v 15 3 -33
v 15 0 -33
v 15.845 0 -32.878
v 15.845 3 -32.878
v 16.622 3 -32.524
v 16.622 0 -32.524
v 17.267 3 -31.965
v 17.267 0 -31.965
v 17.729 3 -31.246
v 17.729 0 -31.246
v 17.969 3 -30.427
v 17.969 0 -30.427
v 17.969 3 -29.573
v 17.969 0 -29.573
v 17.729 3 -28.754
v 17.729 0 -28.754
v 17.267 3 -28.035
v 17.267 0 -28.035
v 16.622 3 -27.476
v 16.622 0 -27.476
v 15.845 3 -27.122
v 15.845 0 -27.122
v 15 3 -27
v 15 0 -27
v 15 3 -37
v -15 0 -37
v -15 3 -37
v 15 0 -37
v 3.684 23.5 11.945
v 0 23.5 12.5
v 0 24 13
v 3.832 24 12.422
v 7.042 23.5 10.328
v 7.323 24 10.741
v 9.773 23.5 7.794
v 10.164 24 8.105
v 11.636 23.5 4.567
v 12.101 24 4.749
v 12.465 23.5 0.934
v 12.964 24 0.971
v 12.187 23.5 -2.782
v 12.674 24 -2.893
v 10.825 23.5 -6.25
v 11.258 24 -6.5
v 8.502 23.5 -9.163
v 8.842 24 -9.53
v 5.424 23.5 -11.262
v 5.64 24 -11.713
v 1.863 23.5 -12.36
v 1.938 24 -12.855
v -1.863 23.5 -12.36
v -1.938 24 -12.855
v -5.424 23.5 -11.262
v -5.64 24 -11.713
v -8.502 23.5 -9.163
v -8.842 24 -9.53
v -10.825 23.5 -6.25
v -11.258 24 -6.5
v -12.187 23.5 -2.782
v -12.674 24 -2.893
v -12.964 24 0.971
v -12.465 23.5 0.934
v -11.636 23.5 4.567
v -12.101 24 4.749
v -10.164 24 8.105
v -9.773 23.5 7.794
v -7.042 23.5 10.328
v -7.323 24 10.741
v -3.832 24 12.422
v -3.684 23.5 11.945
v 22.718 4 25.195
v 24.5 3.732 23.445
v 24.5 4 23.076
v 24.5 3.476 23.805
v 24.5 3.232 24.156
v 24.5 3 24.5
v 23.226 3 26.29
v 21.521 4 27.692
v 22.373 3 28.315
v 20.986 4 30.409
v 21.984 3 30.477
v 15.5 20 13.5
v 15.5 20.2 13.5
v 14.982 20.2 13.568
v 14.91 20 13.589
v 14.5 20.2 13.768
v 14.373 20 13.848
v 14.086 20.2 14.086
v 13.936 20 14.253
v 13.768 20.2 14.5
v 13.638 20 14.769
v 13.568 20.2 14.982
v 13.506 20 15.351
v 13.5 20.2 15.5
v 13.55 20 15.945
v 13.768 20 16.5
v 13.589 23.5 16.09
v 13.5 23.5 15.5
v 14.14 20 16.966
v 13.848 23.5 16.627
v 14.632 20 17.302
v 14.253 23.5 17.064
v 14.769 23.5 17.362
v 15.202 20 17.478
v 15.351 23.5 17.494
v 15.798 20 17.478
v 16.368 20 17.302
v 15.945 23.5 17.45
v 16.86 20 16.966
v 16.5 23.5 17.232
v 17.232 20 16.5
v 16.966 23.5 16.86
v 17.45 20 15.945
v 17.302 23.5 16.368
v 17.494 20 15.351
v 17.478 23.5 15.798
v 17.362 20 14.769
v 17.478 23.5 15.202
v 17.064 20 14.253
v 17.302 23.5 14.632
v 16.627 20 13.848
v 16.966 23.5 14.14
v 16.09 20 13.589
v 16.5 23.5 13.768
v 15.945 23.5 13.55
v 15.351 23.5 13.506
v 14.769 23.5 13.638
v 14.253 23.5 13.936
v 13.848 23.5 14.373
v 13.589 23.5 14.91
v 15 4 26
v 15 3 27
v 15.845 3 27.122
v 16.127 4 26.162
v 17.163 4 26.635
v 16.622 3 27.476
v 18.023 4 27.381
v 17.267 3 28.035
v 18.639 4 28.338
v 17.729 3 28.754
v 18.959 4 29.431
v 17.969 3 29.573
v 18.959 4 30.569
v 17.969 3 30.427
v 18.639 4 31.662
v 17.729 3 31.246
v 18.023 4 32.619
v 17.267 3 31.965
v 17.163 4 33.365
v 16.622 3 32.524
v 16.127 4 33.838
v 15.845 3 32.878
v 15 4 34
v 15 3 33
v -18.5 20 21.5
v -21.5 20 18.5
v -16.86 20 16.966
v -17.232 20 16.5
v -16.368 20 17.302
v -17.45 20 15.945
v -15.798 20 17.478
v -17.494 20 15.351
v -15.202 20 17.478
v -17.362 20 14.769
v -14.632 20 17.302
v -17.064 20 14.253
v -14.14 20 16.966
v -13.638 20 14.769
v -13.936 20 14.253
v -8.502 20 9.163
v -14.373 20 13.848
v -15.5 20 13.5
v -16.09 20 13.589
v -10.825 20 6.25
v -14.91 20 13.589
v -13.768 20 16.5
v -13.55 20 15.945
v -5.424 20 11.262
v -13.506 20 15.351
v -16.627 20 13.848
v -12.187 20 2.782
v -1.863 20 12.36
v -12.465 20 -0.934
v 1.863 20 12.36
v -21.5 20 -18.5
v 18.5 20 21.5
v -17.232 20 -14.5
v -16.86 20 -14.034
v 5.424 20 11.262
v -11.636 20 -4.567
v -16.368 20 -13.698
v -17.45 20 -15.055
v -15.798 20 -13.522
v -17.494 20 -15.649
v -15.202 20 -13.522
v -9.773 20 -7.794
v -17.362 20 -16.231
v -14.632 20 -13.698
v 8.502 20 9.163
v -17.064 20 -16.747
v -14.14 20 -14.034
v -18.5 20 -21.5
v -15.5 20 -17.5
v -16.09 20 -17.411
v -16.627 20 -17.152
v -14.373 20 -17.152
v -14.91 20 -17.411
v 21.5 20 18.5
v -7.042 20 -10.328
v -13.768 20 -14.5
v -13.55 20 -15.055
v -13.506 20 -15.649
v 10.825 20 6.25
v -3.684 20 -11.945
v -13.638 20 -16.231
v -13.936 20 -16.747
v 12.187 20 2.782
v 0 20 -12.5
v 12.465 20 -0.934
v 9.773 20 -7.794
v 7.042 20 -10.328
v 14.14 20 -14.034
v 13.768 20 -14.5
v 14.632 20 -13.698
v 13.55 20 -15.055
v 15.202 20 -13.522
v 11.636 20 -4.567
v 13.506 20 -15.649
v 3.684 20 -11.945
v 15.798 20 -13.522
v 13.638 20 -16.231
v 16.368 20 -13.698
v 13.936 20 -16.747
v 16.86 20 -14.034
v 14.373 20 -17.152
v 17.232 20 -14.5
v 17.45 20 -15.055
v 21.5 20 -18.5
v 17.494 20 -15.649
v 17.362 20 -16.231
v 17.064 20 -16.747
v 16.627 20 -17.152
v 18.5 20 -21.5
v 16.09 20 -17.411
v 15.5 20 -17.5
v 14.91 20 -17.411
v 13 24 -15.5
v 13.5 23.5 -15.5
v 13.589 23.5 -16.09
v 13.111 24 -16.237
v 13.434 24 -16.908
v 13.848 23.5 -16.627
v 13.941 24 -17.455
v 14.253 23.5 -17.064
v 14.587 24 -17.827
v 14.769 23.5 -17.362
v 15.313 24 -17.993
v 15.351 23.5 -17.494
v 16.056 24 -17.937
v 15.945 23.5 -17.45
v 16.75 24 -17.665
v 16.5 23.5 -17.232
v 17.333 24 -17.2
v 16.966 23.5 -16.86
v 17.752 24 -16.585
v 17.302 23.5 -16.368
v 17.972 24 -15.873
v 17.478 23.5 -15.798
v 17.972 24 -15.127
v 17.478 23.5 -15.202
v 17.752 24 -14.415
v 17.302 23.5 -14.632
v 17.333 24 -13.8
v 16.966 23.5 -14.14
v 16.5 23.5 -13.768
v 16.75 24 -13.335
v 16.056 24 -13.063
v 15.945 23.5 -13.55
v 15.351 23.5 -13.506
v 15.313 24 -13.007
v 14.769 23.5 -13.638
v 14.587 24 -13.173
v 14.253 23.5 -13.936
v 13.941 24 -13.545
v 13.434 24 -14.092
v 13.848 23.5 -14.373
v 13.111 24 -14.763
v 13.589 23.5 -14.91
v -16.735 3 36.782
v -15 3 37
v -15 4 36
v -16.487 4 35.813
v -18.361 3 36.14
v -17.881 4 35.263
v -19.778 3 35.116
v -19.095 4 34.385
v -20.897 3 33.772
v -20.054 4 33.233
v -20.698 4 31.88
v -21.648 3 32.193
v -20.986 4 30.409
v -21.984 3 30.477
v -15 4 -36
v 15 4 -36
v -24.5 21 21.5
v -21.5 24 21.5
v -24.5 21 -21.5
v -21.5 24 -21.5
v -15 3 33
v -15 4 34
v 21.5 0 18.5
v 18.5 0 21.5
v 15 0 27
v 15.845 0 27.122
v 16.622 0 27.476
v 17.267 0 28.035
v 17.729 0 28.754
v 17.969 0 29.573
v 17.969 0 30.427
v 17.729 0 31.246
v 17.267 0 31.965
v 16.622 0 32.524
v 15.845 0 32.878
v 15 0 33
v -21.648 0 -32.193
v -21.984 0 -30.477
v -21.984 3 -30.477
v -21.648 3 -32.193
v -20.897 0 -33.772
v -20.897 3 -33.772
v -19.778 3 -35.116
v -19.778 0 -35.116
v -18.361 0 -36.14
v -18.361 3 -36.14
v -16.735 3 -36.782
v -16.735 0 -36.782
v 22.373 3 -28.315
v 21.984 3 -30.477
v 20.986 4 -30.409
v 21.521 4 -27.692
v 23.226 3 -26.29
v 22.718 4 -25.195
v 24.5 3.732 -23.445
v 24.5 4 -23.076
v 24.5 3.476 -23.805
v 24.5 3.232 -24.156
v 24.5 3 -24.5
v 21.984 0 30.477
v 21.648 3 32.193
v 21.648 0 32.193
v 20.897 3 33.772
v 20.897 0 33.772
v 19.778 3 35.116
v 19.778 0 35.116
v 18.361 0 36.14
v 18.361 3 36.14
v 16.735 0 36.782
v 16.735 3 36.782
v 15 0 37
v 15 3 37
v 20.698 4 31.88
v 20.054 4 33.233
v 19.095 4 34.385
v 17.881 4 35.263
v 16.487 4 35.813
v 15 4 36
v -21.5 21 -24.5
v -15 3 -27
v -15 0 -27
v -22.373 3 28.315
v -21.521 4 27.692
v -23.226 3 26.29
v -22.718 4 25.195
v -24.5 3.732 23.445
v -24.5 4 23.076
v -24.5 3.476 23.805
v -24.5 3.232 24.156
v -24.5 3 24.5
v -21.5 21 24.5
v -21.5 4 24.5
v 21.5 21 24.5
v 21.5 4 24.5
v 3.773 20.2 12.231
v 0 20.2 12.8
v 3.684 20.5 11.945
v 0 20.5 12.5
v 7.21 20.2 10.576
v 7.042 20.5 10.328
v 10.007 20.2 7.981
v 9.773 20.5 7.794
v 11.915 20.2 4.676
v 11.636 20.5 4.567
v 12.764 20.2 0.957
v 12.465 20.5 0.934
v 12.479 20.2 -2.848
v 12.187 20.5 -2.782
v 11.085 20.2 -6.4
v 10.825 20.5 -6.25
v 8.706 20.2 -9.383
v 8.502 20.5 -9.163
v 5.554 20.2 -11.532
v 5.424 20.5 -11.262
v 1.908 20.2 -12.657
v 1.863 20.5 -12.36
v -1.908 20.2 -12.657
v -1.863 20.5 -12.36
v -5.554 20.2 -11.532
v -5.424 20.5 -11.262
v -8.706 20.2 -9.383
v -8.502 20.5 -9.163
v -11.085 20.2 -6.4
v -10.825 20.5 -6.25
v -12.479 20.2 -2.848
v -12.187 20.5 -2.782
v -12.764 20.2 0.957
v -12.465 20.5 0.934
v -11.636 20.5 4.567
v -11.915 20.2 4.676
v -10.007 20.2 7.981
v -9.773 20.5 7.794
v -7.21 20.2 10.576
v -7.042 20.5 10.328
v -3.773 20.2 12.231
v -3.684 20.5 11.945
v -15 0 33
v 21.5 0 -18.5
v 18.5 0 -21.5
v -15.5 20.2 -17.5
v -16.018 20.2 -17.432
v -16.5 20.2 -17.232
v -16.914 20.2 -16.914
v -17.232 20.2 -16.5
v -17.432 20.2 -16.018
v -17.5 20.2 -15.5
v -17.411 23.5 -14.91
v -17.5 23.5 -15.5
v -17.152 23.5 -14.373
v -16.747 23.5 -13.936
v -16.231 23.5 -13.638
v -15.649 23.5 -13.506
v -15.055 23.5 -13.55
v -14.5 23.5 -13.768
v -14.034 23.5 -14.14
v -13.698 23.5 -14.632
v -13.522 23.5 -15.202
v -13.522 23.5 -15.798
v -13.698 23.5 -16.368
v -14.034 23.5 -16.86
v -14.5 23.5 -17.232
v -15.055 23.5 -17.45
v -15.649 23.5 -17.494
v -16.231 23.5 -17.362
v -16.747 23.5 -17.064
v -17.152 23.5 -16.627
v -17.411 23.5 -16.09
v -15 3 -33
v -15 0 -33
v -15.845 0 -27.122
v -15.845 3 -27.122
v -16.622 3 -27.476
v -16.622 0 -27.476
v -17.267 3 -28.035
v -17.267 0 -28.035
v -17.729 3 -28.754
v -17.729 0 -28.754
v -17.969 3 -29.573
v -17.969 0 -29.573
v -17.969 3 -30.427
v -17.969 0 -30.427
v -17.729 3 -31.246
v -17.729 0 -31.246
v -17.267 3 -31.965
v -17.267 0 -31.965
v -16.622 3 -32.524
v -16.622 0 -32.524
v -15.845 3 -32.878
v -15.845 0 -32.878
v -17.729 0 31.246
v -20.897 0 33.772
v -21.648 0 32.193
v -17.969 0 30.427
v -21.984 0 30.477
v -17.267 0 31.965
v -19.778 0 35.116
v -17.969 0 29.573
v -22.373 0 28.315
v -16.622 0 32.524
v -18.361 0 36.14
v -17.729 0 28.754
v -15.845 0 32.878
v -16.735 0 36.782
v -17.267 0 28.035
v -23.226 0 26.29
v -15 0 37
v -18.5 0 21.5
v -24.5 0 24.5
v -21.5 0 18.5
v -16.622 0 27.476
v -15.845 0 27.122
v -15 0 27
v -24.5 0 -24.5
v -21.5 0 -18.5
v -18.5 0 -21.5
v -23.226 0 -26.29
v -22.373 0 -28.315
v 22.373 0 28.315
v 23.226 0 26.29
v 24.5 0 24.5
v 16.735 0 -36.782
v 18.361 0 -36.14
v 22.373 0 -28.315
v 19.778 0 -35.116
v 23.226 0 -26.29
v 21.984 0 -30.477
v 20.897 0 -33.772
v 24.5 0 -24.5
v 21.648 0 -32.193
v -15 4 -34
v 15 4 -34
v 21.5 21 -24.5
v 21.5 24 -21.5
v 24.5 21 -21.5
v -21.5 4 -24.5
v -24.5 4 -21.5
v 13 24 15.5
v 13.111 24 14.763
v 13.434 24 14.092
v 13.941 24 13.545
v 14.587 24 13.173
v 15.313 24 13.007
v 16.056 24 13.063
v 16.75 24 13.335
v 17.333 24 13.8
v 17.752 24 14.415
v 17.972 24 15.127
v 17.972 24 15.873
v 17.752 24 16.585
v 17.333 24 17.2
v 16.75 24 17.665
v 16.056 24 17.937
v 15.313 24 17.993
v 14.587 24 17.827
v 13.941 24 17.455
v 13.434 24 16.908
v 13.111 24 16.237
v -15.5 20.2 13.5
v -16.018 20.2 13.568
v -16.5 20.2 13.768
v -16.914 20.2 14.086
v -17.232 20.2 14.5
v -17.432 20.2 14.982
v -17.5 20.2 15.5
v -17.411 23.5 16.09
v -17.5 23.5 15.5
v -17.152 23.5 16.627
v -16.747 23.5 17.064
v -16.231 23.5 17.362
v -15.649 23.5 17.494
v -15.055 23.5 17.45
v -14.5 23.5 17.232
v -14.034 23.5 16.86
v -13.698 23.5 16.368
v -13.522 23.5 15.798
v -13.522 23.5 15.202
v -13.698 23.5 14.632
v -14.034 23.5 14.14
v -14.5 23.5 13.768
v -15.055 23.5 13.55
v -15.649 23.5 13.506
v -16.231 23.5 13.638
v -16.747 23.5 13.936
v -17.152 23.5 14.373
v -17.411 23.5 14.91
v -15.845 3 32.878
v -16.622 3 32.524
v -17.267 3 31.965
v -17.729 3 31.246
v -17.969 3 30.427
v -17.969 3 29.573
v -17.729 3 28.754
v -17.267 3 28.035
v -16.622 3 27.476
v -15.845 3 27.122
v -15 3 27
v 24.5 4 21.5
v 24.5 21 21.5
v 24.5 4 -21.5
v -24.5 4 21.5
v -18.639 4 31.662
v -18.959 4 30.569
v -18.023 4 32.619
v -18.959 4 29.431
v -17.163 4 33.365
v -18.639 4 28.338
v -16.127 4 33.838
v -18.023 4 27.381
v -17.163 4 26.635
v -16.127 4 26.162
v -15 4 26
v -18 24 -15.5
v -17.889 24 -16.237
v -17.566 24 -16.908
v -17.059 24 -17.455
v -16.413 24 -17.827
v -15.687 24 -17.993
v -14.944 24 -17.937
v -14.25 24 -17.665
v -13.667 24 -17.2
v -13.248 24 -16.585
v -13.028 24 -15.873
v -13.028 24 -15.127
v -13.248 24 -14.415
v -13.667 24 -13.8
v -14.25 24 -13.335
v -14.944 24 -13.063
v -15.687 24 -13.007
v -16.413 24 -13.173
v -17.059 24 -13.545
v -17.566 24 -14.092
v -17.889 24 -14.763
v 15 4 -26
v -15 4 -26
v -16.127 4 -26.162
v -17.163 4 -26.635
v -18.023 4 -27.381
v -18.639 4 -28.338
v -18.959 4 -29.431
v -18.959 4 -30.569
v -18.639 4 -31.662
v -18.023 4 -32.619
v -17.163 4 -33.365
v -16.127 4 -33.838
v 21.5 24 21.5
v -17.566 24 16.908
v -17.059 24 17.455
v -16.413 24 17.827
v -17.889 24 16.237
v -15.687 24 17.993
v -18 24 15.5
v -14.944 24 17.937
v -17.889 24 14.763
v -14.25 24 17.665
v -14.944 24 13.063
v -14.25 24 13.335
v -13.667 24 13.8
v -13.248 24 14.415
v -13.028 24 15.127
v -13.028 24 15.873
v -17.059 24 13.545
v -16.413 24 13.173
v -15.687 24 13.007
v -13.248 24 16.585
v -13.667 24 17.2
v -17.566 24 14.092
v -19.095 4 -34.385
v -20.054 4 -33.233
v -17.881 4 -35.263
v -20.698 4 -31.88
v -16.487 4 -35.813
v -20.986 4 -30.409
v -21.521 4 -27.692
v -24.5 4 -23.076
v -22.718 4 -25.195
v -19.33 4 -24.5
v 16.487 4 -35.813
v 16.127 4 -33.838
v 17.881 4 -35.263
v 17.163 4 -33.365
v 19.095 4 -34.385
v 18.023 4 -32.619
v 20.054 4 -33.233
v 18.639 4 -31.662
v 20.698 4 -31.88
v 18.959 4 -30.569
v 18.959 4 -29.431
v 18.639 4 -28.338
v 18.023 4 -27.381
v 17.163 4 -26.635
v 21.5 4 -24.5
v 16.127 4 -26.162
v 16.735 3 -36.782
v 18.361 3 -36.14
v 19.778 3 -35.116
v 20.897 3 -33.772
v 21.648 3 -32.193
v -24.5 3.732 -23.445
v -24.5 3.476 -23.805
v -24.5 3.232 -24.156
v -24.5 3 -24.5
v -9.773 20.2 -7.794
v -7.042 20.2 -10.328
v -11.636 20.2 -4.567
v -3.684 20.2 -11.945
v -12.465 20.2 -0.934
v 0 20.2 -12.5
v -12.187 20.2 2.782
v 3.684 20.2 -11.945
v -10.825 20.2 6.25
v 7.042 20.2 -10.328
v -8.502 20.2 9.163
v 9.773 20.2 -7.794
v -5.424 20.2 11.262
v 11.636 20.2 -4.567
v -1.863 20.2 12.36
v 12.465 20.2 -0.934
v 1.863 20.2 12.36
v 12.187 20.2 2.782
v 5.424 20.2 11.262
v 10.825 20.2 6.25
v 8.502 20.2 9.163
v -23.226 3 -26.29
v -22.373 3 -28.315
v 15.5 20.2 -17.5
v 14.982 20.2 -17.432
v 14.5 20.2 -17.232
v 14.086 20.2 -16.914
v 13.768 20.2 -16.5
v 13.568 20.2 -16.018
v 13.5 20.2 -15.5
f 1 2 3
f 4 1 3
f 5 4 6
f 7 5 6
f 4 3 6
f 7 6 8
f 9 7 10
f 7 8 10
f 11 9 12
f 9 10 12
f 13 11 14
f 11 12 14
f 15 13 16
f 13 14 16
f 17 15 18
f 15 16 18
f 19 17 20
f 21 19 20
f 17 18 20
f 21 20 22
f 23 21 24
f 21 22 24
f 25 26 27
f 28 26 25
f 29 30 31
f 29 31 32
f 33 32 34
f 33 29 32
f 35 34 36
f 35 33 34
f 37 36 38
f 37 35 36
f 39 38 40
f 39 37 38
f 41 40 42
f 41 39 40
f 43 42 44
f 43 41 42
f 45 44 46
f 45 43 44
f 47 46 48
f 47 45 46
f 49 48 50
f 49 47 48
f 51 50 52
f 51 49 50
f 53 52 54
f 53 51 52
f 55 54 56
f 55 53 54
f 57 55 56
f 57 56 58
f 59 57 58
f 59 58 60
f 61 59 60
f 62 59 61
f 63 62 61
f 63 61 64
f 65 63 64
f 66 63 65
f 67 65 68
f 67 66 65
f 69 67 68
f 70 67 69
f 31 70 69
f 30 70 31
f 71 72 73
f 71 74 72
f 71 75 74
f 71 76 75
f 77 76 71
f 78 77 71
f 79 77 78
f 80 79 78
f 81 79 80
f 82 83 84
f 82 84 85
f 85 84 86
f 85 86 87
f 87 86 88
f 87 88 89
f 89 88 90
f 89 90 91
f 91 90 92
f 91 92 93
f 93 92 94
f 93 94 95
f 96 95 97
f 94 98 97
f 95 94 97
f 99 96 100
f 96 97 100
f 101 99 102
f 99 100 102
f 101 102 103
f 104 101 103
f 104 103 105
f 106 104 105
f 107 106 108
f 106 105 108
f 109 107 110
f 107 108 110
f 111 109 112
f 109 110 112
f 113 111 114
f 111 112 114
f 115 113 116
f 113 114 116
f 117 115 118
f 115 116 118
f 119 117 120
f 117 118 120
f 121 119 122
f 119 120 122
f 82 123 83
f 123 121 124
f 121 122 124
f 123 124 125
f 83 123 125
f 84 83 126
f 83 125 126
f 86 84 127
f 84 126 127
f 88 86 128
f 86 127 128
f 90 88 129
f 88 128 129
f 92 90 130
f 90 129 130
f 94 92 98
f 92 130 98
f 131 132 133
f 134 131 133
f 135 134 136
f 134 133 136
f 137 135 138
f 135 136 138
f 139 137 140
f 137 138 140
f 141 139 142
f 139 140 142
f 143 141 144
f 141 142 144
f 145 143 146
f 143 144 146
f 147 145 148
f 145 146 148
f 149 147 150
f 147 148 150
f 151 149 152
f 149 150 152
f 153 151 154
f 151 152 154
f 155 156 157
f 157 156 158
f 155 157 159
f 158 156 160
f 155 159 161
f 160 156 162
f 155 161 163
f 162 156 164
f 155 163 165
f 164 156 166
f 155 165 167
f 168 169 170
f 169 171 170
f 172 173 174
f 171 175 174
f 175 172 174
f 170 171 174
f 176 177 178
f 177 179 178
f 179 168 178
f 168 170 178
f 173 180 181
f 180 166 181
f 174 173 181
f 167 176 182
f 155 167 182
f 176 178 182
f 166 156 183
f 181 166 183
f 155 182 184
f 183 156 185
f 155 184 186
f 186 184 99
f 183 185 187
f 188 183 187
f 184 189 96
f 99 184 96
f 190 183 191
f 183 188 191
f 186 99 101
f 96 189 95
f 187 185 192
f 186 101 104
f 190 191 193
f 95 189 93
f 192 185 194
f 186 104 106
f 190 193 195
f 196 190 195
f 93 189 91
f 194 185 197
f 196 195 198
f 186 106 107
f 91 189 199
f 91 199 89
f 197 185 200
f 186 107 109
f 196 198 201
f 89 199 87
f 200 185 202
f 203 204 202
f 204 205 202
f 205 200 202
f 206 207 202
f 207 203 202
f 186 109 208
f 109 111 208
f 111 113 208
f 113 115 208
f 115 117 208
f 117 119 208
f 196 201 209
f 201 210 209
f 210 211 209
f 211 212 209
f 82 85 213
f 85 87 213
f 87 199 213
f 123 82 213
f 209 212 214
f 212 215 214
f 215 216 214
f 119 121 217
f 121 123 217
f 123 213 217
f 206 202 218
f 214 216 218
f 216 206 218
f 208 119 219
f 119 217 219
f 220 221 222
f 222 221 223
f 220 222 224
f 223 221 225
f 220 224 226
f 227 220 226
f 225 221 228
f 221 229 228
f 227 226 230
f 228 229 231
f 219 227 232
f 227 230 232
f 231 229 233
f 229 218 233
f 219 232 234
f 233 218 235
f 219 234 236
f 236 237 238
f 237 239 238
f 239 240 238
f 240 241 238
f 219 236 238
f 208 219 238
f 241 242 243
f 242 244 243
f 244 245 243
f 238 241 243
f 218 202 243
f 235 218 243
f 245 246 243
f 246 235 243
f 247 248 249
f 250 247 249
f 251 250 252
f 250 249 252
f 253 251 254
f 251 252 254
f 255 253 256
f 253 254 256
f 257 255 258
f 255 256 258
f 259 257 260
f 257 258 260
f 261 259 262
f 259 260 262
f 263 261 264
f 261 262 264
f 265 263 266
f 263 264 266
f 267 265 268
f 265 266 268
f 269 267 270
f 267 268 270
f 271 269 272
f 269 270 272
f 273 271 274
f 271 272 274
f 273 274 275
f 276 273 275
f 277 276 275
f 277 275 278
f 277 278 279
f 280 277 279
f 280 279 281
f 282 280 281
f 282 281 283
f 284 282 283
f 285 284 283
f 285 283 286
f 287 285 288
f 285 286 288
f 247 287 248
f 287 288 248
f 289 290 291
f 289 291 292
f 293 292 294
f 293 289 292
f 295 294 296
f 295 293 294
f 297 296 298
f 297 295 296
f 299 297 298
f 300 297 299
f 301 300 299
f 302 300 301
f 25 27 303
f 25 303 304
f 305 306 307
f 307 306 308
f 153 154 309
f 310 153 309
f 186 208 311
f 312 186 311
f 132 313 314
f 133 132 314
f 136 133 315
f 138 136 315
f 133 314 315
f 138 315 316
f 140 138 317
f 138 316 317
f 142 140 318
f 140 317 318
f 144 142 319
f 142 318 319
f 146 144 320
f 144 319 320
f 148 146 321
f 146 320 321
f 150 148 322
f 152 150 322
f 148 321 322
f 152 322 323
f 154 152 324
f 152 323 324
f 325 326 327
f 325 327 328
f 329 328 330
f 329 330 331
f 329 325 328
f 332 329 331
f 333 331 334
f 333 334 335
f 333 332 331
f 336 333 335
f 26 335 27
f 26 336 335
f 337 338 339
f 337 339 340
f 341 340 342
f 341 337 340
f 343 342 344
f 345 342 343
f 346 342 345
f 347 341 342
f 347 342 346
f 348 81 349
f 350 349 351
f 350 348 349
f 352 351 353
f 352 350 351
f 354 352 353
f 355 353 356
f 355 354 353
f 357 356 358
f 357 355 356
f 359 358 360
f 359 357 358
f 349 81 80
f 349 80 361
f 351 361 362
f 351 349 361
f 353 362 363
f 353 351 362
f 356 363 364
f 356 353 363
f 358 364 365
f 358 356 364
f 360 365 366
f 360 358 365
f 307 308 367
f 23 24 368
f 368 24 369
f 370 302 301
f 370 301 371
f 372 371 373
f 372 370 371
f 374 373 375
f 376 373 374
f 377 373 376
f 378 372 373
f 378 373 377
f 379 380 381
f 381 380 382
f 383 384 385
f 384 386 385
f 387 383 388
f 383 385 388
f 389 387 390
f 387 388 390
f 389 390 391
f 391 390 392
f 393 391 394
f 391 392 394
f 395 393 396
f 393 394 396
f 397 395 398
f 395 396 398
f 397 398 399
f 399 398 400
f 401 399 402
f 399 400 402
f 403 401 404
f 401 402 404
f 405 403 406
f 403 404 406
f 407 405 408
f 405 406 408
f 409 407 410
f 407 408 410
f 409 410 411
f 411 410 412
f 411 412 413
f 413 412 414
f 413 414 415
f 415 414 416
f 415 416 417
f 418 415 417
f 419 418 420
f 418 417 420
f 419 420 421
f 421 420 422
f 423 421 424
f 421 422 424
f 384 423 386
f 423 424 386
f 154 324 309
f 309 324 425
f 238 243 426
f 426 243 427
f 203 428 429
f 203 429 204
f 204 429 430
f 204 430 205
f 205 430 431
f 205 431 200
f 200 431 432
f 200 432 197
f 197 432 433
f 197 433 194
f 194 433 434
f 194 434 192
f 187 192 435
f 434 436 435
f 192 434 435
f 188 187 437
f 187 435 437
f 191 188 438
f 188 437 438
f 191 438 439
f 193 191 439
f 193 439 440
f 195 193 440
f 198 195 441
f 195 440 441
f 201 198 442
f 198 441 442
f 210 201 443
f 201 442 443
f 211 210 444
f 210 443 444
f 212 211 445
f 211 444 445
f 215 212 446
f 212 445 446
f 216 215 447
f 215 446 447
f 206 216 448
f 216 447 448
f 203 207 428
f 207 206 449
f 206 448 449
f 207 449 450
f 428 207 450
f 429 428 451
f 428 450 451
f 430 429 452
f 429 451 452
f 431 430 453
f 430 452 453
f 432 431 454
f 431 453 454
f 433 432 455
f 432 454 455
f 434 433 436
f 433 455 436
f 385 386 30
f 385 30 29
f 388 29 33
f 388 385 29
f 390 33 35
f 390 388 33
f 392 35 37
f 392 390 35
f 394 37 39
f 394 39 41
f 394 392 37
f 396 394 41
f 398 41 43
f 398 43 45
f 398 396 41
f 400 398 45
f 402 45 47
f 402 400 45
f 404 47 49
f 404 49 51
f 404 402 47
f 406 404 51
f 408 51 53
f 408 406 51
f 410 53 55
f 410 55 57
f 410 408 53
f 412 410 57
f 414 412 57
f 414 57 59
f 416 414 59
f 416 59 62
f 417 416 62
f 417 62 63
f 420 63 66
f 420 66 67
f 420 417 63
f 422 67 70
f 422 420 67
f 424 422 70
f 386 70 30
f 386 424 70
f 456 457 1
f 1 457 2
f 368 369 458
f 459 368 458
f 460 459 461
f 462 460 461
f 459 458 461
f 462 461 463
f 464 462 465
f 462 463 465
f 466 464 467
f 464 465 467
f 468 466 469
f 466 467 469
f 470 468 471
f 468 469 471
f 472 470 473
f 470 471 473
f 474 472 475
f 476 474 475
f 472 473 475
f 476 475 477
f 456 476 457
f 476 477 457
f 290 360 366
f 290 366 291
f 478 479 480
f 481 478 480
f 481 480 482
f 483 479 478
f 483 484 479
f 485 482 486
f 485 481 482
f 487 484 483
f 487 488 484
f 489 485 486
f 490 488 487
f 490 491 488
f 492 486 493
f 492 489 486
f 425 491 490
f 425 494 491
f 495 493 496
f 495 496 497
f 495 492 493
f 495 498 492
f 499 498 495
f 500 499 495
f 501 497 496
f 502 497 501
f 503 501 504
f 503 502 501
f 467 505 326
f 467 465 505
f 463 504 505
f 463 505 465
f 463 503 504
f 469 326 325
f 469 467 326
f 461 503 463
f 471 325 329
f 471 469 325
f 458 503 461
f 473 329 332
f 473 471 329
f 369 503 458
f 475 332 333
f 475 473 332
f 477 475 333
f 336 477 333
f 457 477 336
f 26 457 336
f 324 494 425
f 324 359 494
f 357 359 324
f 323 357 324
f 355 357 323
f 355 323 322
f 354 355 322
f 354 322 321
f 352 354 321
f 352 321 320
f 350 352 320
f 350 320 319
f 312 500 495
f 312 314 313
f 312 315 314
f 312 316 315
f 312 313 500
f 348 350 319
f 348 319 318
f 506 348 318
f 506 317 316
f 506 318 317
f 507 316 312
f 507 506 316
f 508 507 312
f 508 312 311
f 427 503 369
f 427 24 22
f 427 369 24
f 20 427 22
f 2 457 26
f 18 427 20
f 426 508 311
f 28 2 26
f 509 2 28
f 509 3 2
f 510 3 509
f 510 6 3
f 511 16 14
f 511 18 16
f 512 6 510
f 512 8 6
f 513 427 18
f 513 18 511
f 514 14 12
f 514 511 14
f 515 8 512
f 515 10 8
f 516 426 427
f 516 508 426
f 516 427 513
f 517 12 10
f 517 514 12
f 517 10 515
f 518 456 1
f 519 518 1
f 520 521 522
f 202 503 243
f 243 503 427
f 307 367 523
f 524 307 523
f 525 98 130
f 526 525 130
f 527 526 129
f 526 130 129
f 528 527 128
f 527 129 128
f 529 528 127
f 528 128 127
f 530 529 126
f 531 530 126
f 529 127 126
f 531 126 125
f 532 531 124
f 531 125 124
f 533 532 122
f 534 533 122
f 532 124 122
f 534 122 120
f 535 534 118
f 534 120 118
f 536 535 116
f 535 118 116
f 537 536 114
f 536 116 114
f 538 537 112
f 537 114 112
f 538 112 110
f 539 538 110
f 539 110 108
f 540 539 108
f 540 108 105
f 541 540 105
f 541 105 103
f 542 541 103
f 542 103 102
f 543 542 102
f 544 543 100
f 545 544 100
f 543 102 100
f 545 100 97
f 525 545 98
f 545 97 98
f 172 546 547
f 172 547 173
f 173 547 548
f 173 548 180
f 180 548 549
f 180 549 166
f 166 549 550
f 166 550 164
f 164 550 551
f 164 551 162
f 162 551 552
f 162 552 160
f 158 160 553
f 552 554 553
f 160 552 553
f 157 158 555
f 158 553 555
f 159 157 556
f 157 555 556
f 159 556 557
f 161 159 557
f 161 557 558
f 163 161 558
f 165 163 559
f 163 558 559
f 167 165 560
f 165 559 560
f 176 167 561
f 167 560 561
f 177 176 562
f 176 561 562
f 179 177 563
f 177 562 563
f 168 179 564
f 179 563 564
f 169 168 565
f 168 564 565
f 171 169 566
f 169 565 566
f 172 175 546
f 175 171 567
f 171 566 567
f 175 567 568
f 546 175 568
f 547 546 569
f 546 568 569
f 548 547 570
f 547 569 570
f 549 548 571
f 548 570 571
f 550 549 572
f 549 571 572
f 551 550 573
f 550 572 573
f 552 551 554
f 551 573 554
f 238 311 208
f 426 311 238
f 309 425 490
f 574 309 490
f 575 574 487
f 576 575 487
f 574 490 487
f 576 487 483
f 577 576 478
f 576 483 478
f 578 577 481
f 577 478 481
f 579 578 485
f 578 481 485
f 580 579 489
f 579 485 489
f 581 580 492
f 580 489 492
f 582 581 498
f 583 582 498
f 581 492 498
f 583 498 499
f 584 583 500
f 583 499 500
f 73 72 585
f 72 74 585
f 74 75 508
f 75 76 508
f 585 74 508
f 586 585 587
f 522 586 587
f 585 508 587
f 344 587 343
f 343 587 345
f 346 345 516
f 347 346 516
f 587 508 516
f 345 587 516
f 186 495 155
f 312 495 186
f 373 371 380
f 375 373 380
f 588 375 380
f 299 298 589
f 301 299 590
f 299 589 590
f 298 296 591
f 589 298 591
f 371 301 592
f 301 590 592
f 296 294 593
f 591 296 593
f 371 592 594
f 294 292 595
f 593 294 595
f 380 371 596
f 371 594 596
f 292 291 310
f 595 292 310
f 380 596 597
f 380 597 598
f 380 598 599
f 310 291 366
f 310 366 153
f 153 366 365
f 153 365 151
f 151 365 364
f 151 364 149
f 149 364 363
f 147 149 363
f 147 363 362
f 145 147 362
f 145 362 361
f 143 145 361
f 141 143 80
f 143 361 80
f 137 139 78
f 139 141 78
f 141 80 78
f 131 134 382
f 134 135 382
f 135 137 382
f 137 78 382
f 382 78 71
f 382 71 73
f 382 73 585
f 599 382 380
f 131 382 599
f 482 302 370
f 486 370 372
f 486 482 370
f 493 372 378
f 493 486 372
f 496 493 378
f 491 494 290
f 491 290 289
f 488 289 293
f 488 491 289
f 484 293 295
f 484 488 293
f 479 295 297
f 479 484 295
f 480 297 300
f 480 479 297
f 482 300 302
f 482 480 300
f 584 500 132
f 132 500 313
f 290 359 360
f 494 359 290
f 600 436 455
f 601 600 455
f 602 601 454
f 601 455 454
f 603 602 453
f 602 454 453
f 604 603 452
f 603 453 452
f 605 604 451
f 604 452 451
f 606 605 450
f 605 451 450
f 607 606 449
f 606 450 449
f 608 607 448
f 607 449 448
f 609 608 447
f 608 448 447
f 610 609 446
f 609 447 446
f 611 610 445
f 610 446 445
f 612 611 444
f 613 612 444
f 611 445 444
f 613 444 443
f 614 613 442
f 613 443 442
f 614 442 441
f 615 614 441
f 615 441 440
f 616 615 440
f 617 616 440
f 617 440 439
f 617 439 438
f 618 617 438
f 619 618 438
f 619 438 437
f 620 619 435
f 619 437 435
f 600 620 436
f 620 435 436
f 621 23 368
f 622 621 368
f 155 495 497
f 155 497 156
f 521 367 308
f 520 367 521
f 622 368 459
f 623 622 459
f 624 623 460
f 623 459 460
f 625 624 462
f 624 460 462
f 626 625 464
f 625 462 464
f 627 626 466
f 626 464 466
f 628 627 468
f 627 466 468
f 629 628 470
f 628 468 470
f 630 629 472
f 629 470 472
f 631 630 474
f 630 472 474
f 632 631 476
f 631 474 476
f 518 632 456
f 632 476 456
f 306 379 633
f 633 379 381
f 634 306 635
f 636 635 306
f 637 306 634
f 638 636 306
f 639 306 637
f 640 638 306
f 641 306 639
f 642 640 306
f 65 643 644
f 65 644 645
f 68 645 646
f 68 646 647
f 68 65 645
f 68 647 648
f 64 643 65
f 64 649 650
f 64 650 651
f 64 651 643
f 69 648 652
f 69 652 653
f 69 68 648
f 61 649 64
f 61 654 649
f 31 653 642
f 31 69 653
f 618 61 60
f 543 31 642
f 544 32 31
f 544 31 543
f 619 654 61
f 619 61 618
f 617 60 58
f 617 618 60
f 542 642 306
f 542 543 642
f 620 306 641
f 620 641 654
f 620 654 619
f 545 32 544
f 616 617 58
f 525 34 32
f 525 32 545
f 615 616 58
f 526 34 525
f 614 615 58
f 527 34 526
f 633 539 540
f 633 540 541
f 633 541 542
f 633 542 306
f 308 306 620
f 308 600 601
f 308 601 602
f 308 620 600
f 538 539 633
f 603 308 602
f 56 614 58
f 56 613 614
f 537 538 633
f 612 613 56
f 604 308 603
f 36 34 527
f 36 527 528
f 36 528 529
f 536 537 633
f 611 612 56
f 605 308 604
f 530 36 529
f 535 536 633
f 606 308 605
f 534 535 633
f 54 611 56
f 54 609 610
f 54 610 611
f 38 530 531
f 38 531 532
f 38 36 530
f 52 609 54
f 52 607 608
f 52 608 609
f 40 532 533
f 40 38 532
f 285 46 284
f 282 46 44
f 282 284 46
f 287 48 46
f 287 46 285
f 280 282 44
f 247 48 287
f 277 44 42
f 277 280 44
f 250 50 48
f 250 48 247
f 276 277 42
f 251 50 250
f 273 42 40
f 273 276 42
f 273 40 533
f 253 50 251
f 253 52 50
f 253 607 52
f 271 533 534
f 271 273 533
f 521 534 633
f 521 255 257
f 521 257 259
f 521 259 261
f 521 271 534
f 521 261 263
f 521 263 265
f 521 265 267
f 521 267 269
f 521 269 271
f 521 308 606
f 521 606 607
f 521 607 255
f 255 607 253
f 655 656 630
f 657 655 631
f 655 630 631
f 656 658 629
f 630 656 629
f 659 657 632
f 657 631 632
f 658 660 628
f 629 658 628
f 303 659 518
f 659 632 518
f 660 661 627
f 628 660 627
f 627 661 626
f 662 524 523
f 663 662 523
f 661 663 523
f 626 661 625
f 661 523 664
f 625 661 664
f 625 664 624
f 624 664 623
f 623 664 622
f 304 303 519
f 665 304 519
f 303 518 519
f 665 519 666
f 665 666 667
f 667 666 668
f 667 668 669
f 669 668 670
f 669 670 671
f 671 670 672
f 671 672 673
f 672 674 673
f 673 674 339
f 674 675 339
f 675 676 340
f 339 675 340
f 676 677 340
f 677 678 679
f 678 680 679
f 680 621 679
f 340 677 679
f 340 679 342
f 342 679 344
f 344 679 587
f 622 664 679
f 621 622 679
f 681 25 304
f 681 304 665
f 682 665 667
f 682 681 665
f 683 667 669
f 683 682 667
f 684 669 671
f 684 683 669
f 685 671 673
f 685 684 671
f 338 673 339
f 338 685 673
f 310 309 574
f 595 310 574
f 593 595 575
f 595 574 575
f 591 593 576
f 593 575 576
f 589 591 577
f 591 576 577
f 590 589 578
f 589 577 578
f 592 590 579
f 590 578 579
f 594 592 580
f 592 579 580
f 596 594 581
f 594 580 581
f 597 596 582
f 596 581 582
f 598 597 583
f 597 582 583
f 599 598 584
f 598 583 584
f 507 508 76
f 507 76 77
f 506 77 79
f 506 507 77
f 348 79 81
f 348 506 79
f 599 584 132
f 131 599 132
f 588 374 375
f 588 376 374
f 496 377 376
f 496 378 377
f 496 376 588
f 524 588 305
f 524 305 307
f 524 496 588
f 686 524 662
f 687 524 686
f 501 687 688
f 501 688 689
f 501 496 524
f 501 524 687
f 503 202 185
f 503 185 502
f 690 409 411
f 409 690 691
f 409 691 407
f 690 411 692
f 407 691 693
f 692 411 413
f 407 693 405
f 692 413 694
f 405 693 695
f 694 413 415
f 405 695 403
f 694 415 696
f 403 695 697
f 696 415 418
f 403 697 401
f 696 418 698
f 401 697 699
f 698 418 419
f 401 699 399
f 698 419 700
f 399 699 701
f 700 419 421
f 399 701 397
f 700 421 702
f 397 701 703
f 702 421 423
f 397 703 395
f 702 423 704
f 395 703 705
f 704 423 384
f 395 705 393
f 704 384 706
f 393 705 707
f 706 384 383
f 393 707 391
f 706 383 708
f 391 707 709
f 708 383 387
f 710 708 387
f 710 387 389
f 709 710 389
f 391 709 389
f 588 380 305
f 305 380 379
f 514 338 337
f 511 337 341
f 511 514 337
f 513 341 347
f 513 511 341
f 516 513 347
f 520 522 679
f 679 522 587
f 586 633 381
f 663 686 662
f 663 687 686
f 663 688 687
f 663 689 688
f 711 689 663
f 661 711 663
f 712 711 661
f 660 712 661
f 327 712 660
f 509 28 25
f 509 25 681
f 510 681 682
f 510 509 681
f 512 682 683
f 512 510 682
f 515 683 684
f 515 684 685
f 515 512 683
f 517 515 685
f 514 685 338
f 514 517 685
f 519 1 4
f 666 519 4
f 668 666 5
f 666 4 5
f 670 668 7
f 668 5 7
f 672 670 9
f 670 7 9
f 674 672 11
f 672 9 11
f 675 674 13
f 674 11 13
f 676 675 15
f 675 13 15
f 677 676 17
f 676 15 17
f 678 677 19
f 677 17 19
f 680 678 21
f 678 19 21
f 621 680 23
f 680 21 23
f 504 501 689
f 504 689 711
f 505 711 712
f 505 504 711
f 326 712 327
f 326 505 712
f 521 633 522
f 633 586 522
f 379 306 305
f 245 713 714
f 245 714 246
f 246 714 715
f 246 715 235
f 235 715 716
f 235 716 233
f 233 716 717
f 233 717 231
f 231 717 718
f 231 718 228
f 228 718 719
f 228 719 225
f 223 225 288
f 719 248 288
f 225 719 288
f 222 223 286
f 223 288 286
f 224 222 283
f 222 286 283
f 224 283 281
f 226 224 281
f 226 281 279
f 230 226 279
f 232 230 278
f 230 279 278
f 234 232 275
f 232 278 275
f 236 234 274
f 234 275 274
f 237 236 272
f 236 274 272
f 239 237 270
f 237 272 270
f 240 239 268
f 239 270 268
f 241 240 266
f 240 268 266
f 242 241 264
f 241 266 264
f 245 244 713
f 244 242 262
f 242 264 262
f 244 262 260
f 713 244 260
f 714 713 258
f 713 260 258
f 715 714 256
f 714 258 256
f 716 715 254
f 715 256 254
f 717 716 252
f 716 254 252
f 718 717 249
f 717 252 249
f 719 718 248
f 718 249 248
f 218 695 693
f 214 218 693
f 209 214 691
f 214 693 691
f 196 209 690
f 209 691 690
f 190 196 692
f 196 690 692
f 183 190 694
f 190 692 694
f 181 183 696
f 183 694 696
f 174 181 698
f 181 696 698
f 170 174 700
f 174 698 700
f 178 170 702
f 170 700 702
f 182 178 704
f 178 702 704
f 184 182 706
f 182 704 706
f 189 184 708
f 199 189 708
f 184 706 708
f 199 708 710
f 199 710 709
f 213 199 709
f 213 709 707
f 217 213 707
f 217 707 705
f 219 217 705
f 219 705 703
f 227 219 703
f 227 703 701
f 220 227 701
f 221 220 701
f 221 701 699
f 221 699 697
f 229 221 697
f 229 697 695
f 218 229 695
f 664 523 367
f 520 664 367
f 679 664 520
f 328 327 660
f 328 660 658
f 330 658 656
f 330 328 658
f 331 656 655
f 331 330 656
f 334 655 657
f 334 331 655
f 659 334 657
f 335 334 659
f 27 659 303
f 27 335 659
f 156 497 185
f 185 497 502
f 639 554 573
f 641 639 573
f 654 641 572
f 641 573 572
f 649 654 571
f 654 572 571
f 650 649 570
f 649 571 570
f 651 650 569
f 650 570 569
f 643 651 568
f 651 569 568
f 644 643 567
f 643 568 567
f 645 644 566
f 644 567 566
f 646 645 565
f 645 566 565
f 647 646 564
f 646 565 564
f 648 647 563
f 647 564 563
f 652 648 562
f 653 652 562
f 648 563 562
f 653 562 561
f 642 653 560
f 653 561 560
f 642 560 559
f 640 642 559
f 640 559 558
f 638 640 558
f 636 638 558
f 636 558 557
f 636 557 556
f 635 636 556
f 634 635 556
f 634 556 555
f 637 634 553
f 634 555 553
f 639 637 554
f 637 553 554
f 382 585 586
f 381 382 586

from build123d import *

# Parameters (mm, degrees)
SKETCH1_W             = 43
SKETCH1_H             = 43
BOSS_EXTRUDE1_DEPTH   = 4
SKETCH2_W             = 49
SKETCH2_H             = 49
SKETCH2_W_2           = 43
SKETCH2_H_2           = 43
BOSS_EXTRUDE2_DEPTH   = 16
FILLET1_R             = 10
SKETCH3_W             = 49
SKETCH3_H             = 49
SKETCH3_R             = 12.5
BOSS_EXTRUDE3_DEPTH   = 4
F_4_0MM_DOWEL_HOLE1_D = 4
CHAMFER1_SIZE         = 3
CHAMFER3_SIZE         = 0.5
CHAMFER4_SIZE         = 1
SKETCH8_W             = 38.715759924
SKETCH8_H             = 37.056710796
BOSS_EXTRUDE4_DEPTH   = 0.2
SKETCH9_R             = 12.5
CUT_EXTRUDE2_DEPTH    = 49.757460968
SKETCH10_R            = 2
CUT_EXTRUDE3_DEPTH    = 49.757460968


with BuildPart() as part:
    # Sketch1 → Boss-Extrude1 (new body)
    with BuildSketch(Plane(origin=(0, 0, 0), x_dir=(1, 0, 0), z_dir=(0, 1, 0))):
        with BuildLine():
            Line((-24.5, 24.5), (-19.330127019, 24.5))
            ThreePointArc((-19.330127019, 24.5), (-21.614378278, 32.291287847), (-15, 37))
            Line((-15, 37), (15, 37))
            ThreePointArc((15, 37), (21.614378278, 32.291287847), (19.330127019, 24.5))
            Line((19.330127019, 24.5), (24.5, 24.5))
            Line((24.5, 24.5), (24.5, 6.437196595))
            Line((24.5, 6.437196595), (24.5, -24.5))
            Line((24.5, -24.5), (19.330127019, -24.5))
            ThreePointArc((19.330127019, -24.5), (21.614378278, -32.291287847), (15, -37))
            Line((15, -37), (-15, -37))
            ThreePointArc((-15, -37), (-21.614378278, -32.291287847), (-19.330127019, -24.5))
            Line((-19.330127019, -24.5), (-24.5, -24.5))
            Line((-24.5, -24.5), (-24.5, 6.437196595))
            Line((-24.5, 6.437196595), (-24.5, 24.5))
        make_face()
        Rectangle(SKETCH1_W, SKETCH1_H, mode=Mode.SUBTRACT)
        with BuildLine():
            Line((15, 27), (-15, 27))
            ThreePointArc((-15, 27), (-18, 30), (-15, 33))
            Line((-15, 33), (15, 33))
            ThreePointArc((15, 33), (18, 30), (15, 27))
        make_face(mode=Mode.SUBTRACT)
        with BuildLine():
            Line((-15, -27), (15, -27))
            ThreePointArc((15, -27), (18, -30), (15, -33))
            Line((15, -33), (-15, -33))
            ThreePointArc((-15, -33), (-18, -30), (-15, -27))
        make_face(mode=Mode.SUBTRACT)
    extrude(amount=BOSS_EXTRUDE1_DEPTH)

    # Sketch2 → Boss-Extrude2 (add)
    with BuildSketch(Plane(origin=(0, 4, 0), x_dir=(1, 0, 0), z_dir=(0, 1, 0))):
        Rectangle(SKETCH2_W, SKETCH2_H)
        Rectangle(SKETCH2_W_2, SKETCH2_H_2, mode=Mode.SUBTRACT)
    extrude(amount=BOSS_EXTRUDE2_DEPTH)

    # Fillet1
    # the kernel refuses this fillet: 10 mm, written as the material it adds along each edge
    with BuildSketch(Plane(origin=(19.330127019, 0, 24.5), x_dir=(0.405761244184207, 0, 0.913979109563279), z_dir=(0, 1, 0))) as fillet1_piece_1:
        with BuildLine():
            CenterArc((11.211042432, 8.841903543), FILLET1_R, 204.310084353, 37.841965765)
            Line((2.097734093, 4.725155904), (1.915467926, 4.642820951))
            ThreePointArc((1.915467926, 4.642820951), (0.866071225, 2.443730201), (-0.182795822, 0.081152249))
            Line((-0.182795822, 0.081152249), (0.093425354, -0.176838071))
            ThreePointArc((0.093425354, -0.176838071), (3.269887376, 0.61066752), (6.446349398, -0.176838071))
            Line((6.446349398, -0.176838071), (6.539774752, 0))
        make_face()
    extrude(amount=4)
    with BuildSketch(Plane(origin=(19.330127019, 0, -24.5), x_dir=(1, 0, 0), z_dir=(0, 1, 0))) as fillet1_piece_2:
        with BuildLine():
            CenterArc((12.630321653, 6.658956796), FILLET1_R, 183.909110465, 37.841965765)
            Line((2.65358714, 5.977217504), (2.45405245, 5.963582719))
            ThreePointArc((2.45405245, 5.963582719), (1.884930926, 2.74082354), (-0.123717915, 0.157142857))
            Line((-0.123717915, 0.157142857), (0, -0.2))
            ThreePointArc((0, -0.2), (2.584936491, -0.2), (5.020664008, -0.133179136))
            Line((5.020664008, -0.133179136), (5.169872981, 0))
        make_face()
    extrude(amount=4)
    with BuildSketch(Plane(origin=(-19.330127019, 0, -24.5), x_dir=(-1, 0, 0), z_dir=(0, 1, 0))) as fillet1_piece_3:
        with BuildLine():
            CenterArc((12.630321653, -6.658956796), FILLET1_R, 138.24892377, 37.841965765)
            Line((2.65358714, -5.977217504), (2.45405245, -5.963582719))
            ThreePointArc((2.45405245, -5.963582719), (1.884930926, -2.74082354), (-0.123717915, -0.157142857))
            Line((-0.123717915, -0.157142857), (0, 0.2))
            ThreePointArc((0, 0.2), (2.584936491, 0.2), (5.020664008, 0.133179136))
            Line((5.020664008, 0.133179136), (5.169872981, 0))
        make_face()
    extrude(amount=4)
    with BuildSketch(Plane(origin=(-19.330127019, 0, 24.5), x_dir=(-0.40576124418420745, 0, 0.9139791095632787), z_dir=(0, 1, 0))) as fillet1_piece_4:
        with BuildLine():
            CenterArc((11.211042432, -8.841903543), FILLET1_R, 117.847949882, 37.841965765)
            Line((2.097734093, -4.725155904), (1.915467926, -4.642820951))
            ThreePointArc((1.915467926, -4.642820951), (0.866071225, -2.443730201), (-0.182795822, -0.081152249))
            Line((-0.182795822, -0.081152249), (0.093425354, 0.176838071))
            ThreePointArc((0.093425354, 0.176838071), (3.269887376, -0.61066752), (6.446349398, 0.176838071))
            Line((6.446349398, 0.176838071), (6.539774752, 0))
        make_face()
    extrude(amount=4)

    # Sketch3 → Boss-Extrude3 (add)
    with BuildSketch(Plane(origin=(0, 20, 0), x_dir=(1, 0, 0), z_dir=(0, 1, 0))):
        Rectangle(SKETCH3_W, SKETCH3_H)
        with Locations(Location((0, 0, 0), (0, 0, 270))):
            Circle(SKETCH3_R, mode=Mode.SUBTRACT)
    extrude(amount=BOSS_EXTRUDE3_DEPTH)

    # Ø4.0mm Dowel Hole1 (through all)
    with Locations(Plane(origin=(0, 24, 0), x_dir=(1, 0, 0), z_dir=(0, 1, 0))):
        with Locations((15.5, 15.5), (-15.5, 15.5), (-15.5, -15.5), (15.5, -15.5)):
            Hole(F_4_0MM_DOWEL_HOLE1_D / 2)

    # Chamfer1
    chamfer1_edges = [part.edges().sort_by_distance(p)[0] for p in [
        (24.5, 24, 0),
        (0, 24, -24.5),
        (-24.5, 24, 0),
        (0, 24, 24.5),
        (-24.5, 14, 24.5),
        (-24.5, 14, -24.5),
        (24.5, 14, -24.5),
        (24.5, 14, 24.5),
        (-21.5, 10, -21.5),
        (-21.5, 10, 21.5),
        (21.5, 10, 21.5),
        (21.5, 10, -21.5),
    ]]
    chamfer(chamfer1_edges, length=CHAMFER1_SIZE)

    # Chamfer3
    chamfer3_edges = [part.edges().sort_by_distance(p)[0] for p in [
        (0, 20, -12.5),
        (0, 24, -12.5),
        (17.5, 24, 15.5),
        (-13.5, 24, 15.5),
        (-13.5, 24, -15.5),
        (17.5, 24, -15.5),
    ]]
    chamfer(chamfer3_edges, length=CHAMFER3_SIZE)

    # Chamfer4
    chamfer4_edges = [part.edges().sort_by_distance(p)[0] for p in [
        (-19.778047586, 4, 35.115687761),
        (19.778047586, 4, -35.115687761),
        (0, 4, -37),
        (-22.743853768, 4, 27.278959583),
        (22.743853768, 4, 27.278959583),
        (22.743853768, 4, -27.278959583),
        (-22.743853768, 4, -27.278959583),
        (-19.778047586, 4, -35.115687761),
        (18, 4, 30),
        (0, 4, 33),
        (-18, 4, 30),
        (18, 4, -30),
        (0, 4, -27),
        (-18, 4, -30),
        (0, 4, -33),
        (0, 4, 37),
        (19.778047586, 4, 35.115687761),
        (0, 4, 27),
    ]]
    chamfer(chamfer4_edges, length=CHAMFER4_SIZE)

    # Sketch8 → Boss-Extrude4 (add)
    with BuildSketch(Plane.XZ.offset(-20)):
        Rectangle(SKETCH8_W, SKETCH8_H)
    extrude(amount=-BOSS_EXTRUDE4_DEPTH)

    # Sketch9 → Cut-Extrude2 (cut, through all)
    with BuildSketch(Plane(origin=(0, 20.2, 0), x_dir=(1, 0, 0), z_dir=(0, 1, 0))):
        with Locations(Location((0, 0, 0), (0, 0, 90))):
            Circle(SKETCH9_R)
    extrude(amount=-CUT_EXTRUDE2_DEPTH, mode=Mode.SUBTRACT)

    # Sketch10 → Cut-Extrude3 (cut, through all)
    with BuildSketch(Plane(origin=(0, 20.2, 0), x_dir=(1, 0, 0), z_dir=(0, 1, 0))):
        with Locations(Location((-15.5, 15.5, 0), (0, 0, 90))):
            Circle(SKETCH10_R)
        with Locations(Location((-15.5, -15.5, 0), (0, 0, 90))):
            Circle(SKETCH10_R)
        with Locations(Location((15.5, -15.5, 0), (0, 0, 90))):
            Circle(SKETCH10_R)
        with Locations(Location((15.5, 15.5, 0), (0, 0, 90))):
            Circle(SKETCH10_R)
    extrude(amount=-CUT_EXTRUDE3_DEPTH, mode=Mode.SUBTRACT)


solid = part.part
